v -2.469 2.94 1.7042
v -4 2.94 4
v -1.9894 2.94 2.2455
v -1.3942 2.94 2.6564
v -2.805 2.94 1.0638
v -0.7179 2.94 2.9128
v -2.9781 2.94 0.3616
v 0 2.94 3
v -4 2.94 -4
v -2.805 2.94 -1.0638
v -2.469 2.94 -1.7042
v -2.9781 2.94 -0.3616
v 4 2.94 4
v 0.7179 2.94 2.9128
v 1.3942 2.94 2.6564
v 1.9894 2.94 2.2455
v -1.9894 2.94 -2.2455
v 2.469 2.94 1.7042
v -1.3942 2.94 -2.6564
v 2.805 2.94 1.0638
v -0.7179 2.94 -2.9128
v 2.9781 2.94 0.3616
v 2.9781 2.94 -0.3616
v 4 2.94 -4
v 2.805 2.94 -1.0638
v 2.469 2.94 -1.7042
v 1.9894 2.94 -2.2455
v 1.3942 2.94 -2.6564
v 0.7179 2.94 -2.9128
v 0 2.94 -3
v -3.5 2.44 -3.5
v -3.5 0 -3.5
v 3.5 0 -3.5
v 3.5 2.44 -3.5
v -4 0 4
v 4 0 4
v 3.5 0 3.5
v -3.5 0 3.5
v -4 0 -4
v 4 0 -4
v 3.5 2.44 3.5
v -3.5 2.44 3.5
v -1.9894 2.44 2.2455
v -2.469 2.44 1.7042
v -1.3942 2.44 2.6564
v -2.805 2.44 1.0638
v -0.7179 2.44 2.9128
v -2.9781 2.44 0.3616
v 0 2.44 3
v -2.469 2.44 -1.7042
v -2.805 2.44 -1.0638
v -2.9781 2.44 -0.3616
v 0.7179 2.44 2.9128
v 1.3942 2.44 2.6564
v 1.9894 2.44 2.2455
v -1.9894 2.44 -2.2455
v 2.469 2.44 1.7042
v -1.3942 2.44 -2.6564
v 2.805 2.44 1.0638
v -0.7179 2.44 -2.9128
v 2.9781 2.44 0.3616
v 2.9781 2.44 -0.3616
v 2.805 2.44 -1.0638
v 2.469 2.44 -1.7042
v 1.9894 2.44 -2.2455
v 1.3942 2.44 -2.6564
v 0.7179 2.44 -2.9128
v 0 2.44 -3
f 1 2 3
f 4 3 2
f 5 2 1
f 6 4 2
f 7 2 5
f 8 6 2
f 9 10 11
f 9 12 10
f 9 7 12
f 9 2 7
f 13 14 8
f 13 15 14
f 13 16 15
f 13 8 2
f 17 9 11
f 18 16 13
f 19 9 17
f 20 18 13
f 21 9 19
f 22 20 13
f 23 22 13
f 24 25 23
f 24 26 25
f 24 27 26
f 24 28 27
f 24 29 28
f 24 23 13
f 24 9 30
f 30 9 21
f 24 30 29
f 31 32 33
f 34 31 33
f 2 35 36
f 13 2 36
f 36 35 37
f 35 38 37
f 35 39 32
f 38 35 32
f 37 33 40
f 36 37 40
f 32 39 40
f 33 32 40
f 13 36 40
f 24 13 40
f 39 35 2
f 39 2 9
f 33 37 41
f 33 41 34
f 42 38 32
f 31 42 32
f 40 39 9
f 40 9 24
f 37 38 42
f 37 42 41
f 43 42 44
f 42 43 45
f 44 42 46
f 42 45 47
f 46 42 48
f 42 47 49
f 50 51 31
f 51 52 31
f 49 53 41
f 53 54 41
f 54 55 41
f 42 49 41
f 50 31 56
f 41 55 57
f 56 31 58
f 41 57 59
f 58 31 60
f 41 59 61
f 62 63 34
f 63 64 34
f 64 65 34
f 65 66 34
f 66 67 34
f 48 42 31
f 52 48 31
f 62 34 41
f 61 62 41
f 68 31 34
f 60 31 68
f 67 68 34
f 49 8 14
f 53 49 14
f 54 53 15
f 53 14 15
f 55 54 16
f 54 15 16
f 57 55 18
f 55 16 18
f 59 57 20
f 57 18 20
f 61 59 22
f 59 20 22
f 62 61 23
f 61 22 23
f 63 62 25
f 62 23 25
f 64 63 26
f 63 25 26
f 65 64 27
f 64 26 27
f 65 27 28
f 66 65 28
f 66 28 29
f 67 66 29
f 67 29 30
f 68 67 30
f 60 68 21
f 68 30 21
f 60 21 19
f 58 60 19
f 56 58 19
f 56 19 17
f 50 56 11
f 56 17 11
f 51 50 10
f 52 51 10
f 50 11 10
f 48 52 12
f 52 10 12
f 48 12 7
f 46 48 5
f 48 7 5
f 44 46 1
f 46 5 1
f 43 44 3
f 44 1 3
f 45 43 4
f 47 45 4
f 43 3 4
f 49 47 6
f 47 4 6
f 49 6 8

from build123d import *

# Parameters (mm, degrees)
SKETCH1_W           = 8
SKETCH1_H           = 8
SKETCH1_W_2         = 7
SKETCH1_H_2         = 7
BOSS_EXTRUDE1_DEPTH = 2.94
SKETCH2_W           = 8
SKETCH2_H           = 8
SKETCH2_R           = 3
BOSS_EXTRUDE2_DEPTH = 0.5


with BuildPart() as part:
    # Sketch1 → Boss-Extrude1 (new body)
    with BuildSketch(Plane(origin=(0, 0, 0), x_dir=(1, 0, 0), z_dir=(0, 1, 0))):
        Rectangle(SKETCH1_W, SKETCH1_H)
        Rectangle(SKETCH1_W_2, SKETCH1_H_2, mode=Mode.SUBTRACT)
    extrude(amount=BOSS_EXTRUDE1_DEPTH)

    # Sketch2 → Boss-Extrude2 (add)
    with BuildSketch(Plane(origin=(0, 2.94, 0), x_dir=(1, 0, 0), z_dir=(0, 1, 0))):
        Rectangle(SKETCH2_W, SKETCH2_H)
        with Locations(Location((0, 0, 0), (0, 0, 270))):
            Circle(SKETCH2_R, mode=Mode.SUBTRACT)
    extrude(amount=-BOSS_EXTRUDE2_DEPTH)


solid = part.part
